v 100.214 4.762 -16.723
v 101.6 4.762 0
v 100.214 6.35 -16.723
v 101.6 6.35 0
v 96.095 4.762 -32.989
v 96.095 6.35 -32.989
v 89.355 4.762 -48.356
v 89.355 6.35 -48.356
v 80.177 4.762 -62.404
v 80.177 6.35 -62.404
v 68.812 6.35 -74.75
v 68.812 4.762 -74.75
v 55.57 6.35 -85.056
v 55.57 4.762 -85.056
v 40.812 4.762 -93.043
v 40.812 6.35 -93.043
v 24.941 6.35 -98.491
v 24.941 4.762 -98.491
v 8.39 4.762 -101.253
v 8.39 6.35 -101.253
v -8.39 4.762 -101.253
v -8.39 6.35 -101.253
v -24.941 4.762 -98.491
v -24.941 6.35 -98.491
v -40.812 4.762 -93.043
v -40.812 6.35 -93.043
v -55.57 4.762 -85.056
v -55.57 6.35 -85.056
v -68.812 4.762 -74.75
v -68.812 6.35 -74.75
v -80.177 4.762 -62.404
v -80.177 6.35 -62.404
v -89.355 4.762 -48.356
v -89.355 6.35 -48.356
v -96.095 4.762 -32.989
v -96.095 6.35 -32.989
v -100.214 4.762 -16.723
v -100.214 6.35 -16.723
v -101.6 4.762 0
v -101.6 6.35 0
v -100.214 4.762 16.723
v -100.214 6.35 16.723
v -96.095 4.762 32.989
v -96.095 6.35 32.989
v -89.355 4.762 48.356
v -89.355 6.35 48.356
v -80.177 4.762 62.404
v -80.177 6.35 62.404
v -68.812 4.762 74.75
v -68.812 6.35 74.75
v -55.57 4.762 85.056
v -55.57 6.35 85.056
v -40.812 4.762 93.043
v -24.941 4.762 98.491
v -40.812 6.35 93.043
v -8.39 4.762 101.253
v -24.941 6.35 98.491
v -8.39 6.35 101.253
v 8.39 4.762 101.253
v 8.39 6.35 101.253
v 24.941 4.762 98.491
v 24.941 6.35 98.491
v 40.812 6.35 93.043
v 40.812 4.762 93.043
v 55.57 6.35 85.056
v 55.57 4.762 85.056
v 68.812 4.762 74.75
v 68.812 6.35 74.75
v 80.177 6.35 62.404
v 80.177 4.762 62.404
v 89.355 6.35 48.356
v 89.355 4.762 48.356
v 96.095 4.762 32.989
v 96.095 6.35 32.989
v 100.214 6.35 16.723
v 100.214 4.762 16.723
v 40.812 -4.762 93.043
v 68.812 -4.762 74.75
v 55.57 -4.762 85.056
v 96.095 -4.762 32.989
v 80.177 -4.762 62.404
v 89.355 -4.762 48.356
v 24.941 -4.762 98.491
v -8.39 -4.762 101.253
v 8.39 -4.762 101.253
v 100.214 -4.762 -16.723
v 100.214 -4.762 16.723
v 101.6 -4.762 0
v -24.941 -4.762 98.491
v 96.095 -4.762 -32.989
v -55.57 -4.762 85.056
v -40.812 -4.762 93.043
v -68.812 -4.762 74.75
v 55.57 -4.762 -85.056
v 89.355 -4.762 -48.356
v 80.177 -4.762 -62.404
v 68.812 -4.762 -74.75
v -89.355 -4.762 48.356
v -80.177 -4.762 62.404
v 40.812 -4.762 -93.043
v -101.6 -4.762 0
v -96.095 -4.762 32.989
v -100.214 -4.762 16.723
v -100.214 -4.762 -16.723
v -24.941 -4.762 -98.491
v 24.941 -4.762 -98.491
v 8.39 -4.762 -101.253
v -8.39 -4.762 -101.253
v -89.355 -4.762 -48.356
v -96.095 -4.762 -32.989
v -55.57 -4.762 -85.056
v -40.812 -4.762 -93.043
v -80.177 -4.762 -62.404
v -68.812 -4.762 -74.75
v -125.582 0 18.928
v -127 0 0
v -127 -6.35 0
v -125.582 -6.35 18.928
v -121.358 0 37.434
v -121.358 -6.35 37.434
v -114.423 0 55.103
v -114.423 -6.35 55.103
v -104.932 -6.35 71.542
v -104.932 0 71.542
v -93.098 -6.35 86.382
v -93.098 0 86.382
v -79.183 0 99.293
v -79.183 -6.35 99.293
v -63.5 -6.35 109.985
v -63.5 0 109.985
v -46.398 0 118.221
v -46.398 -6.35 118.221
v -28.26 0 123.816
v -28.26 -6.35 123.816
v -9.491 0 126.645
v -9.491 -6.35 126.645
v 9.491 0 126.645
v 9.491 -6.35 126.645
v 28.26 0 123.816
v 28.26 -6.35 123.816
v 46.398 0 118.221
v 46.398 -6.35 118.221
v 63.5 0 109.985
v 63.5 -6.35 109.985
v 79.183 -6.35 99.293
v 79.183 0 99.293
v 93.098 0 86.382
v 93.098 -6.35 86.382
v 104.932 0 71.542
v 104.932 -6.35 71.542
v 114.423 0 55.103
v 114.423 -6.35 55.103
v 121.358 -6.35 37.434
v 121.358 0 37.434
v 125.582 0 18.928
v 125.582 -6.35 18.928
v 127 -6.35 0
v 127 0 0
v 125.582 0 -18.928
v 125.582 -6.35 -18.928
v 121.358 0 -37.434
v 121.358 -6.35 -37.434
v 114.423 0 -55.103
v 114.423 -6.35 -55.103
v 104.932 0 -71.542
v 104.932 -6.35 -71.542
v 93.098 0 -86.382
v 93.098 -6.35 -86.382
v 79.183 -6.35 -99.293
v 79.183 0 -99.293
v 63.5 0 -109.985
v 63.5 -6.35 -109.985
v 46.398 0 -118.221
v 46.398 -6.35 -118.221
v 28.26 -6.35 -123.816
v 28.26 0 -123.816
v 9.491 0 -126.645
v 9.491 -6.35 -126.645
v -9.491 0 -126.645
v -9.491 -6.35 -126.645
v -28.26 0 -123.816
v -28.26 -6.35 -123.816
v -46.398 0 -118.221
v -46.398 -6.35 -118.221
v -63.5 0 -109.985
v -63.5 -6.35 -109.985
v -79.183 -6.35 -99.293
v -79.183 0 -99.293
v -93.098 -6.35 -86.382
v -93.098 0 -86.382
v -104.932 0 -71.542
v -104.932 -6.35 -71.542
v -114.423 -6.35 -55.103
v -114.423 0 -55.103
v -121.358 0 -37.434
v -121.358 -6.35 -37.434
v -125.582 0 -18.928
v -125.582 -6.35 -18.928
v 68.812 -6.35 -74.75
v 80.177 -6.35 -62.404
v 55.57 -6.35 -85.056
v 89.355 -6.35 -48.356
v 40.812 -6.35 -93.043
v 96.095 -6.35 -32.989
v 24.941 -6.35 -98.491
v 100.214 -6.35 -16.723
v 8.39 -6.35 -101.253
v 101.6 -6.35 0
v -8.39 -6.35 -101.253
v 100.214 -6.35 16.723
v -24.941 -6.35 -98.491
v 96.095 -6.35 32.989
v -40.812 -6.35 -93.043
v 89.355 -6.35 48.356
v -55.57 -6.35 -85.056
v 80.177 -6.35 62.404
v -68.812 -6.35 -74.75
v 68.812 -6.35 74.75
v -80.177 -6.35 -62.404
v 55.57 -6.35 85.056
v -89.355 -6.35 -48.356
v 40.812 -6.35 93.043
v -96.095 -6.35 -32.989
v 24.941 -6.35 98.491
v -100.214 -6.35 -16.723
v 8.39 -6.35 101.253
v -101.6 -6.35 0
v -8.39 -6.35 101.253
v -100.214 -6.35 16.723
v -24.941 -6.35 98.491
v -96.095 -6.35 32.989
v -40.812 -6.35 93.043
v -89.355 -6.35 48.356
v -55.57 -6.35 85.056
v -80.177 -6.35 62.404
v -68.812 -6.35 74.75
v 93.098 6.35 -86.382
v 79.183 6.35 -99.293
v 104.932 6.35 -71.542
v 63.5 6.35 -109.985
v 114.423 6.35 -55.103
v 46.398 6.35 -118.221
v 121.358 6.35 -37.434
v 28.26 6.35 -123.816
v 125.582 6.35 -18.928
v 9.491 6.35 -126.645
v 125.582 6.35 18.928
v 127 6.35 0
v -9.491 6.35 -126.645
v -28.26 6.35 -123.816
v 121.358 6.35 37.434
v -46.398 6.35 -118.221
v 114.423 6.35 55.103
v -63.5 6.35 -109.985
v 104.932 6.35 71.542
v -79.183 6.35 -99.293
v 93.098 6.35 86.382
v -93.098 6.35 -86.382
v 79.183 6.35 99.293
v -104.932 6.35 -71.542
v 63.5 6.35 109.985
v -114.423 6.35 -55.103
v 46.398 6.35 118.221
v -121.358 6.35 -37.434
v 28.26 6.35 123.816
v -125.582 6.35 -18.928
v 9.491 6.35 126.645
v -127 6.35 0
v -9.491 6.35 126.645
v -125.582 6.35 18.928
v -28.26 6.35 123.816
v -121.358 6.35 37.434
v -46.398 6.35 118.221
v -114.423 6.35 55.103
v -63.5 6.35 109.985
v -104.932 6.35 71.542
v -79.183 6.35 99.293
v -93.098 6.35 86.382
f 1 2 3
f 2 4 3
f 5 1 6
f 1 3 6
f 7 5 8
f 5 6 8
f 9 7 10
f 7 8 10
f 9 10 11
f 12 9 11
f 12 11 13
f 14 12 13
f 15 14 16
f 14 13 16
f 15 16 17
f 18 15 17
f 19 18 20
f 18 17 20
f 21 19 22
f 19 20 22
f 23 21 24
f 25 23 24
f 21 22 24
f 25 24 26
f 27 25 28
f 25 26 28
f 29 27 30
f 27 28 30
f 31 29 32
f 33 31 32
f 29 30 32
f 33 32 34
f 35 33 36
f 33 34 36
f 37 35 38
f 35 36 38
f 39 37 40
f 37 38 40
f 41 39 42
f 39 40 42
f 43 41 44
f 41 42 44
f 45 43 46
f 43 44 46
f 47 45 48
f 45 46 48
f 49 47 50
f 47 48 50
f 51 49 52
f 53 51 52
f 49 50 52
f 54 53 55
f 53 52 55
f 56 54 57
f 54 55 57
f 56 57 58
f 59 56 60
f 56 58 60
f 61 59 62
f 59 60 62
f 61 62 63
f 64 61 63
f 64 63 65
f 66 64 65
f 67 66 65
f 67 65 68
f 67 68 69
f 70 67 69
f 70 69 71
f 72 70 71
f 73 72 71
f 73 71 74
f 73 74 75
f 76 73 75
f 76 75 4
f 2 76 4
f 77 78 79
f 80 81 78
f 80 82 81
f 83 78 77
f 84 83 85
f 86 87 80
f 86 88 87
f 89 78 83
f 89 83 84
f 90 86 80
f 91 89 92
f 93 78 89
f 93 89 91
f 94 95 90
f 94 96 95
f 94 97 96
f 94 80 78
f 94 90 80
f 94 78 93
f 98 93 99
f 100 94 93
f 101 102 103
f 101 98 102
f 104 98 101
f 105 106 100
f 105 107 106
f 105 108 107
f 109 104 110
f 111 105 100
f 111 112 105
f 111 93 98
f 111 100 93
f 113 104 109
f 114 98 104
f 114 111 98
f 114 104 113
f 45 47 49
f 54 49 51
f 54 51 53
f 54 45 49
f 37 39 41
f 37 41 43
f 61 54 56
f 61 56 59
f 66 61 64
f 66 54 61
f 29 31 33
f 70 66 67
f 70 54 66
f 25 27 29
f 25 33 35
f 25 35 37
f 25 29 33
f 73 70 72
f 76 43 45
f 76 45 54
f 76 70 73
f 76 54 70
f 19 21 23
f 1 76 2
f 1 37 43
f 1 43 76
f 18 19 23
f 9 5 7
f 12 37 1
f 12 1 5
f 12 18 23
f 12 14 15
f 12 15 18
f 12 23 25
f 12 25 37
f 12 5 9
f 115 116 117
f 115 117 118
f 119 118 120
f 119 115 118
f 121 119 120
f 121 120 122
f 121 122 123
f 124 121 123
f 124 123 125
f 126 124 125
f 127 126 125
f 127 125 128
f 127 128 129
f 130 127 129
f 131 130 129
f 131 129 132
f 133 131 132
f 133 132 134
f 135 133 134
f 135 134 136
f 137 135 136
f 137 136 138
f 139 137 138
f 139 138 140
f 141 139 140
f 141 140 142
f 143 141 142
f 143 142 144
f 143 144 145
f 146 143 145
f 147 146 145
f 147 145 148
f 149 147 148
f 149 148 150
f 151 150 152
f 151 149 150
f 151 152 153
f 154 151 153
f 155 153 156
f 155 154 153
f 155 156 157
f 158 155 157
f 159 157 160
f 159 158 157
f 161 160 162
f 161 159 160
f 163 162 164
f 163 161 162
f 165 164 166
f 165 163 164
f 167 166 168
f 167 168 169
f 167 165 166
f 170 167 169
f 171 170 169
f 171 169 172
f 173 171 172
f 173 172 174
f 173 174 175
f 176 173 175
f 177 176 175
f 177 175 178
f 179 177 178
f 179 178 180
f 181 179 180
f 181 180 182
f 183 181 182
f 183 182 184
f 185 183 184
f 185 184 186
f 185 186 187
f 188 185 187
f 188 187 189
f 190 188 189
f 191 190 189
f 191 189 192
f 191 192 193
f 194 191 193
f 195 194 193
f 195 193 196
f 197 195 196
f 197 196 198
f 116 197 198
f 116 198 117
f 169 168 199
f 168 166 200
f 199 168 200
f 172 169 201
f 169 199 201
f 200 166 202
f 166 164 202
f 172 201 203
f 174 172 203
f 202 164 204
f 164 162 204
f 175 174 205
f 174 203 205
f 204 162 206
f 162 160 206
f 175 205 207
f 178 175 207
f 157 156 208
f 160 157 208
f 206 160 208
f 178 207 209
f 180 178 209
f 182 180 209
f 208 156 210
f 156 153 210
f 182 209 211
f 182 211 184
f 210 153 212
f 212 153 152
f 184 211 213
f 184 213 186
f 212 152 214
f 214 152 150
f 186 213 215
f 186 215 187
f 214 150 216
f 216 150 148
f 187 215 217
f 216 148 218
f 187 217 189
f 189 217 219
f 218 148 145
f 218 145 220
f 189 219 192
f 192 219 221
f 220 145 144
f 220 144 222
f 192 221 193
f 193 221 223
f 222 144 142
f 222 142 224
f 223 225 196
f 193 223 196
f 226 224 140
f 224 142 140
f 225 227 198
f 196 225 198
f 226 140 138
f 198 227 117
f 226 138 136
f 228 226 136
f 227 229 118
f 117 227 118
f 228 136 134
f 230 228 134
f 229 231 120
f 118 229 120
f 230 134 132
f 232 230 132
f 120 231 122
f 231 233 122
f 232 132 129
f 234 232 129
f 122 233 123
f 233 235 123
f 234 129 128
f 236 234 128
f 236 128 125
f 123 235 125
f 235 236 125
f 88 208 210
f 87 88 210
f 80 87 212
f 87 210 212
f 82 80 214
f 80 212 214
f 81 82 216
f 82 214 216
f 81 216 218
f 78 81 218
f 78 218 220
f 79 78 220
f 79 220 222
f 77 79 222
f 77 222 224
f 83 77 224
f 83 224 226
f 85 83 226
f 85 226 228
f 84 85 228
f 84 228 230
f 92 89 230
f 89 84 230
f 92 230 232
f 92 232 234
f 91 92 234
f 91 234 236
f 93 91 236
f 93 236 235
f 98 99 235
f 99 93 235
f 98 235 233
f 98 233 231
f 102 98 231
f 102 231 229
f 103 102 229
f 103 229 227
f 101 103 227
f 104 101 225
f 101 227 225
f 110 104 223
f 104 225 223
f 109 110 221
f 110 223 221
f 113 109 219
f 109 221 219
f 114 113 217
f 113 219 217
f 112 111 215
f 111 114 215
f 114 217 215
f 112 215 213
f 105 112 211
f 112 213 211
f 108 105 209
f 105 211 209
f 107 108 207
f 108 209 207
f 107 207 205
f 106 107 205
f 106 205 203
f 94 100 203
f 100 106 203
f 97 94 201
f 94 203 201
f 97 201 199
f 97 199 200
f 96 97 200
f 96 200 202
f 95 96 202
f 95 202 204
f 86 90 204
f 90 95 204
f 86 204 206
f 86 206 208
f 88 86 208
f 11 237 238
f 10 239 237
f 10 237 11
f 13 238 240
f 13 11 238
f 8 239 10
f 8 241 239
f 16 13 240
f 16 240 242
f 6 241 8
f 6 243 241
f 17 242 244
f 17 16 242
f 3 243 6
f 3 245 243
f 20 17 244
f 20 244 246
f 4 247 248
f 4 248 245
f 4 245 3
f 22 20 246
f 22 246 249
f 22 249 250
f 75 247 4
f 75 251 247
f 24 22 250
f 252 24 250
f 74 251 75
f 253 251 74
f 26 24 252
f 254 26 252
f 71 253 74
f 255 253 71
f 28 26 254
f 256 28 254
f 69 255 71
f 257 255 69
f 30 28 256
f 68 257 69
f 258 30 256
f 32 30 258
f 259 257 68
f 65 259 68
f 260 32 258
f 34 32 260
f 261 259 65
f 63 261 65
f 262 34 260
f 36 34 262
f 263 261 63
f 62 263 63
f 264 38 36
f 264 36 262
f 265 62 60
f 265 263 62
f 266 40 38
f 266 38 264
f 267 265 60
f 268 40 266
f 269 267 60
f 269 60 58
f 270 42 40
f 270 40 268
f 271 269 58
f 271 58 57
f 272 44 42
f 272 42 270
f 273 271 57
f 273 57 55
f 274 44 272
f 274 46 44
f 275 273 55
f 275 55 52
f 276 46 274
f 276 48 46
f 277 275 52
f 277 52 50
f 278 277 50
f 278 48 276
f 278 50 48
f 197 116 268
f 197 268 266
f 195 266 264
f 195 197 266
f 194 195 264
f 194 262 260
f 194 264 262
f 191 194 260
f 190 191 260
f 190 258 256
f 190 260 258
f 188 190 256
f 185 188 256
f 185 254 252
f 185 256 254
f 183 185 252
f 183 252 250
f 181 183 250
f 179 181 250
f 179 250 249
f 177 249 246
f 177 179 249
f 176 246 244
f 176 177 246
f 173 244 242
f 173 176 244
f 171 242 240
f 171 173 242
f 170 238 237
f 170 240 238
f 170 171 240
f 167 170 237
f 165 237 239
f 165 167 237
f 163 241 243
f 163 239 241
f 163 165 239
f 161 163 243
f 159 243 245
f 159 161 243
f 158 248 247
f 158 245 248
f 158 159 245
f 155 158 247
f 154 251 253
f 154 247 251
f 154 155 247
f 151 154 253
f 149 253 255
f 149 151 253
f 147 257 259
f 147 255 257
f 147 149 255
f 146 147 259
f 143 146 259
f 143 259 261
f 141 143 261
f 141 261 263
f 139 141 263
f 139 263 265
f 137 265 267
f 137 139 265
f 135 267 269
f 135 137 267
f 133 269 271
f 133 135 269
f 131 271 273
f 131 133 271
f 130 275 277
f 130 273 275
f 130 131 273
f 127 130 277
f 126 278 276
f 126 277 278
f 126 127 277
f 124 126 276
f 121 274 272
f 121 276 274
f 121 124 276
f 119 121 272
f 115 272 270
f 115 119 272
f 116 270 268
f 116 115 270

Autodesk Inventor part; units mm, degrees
ref_plane "YZ Plane" through (0, 0, 0) normal (1, 0, 0) x (0, 1, 0)
ref_plane "XZ Plane" through (0, 0, 0) normal (0, 1, 0) x (-1, 0, 0)
ref_plane "XY Plane" through (0, 0, 0) normal (0, 0, 1) x (1, 0, 0)
sketch "Sketch1" plane through (0, 0, 0) normal (0, 1, 0) x (-1, 0, 0)
  circle A0 centre (0, 0) radius 127
  dimension "d0" = 254
extrude "Extrusion1" add sketch "Sketch1" along normal mid plane 12.7
sketch "Sketch2" plane through (0, 6.35, 0) normal (0, 1, 0) x (1, 0, 0)
  circle A0 centre (0, 0) radius 101.6
  dimension "d3" = 203.2
extrude "Extrusion2" cut sketch "Sketch2" against normal blind 1.5875
mirror "Mirror1" about plane through (0, 0, 0) normal (0, 1, 0) of "Extrusion2"
properties part number "Chip, Simplified" material "Polycarbonate, Clear"
